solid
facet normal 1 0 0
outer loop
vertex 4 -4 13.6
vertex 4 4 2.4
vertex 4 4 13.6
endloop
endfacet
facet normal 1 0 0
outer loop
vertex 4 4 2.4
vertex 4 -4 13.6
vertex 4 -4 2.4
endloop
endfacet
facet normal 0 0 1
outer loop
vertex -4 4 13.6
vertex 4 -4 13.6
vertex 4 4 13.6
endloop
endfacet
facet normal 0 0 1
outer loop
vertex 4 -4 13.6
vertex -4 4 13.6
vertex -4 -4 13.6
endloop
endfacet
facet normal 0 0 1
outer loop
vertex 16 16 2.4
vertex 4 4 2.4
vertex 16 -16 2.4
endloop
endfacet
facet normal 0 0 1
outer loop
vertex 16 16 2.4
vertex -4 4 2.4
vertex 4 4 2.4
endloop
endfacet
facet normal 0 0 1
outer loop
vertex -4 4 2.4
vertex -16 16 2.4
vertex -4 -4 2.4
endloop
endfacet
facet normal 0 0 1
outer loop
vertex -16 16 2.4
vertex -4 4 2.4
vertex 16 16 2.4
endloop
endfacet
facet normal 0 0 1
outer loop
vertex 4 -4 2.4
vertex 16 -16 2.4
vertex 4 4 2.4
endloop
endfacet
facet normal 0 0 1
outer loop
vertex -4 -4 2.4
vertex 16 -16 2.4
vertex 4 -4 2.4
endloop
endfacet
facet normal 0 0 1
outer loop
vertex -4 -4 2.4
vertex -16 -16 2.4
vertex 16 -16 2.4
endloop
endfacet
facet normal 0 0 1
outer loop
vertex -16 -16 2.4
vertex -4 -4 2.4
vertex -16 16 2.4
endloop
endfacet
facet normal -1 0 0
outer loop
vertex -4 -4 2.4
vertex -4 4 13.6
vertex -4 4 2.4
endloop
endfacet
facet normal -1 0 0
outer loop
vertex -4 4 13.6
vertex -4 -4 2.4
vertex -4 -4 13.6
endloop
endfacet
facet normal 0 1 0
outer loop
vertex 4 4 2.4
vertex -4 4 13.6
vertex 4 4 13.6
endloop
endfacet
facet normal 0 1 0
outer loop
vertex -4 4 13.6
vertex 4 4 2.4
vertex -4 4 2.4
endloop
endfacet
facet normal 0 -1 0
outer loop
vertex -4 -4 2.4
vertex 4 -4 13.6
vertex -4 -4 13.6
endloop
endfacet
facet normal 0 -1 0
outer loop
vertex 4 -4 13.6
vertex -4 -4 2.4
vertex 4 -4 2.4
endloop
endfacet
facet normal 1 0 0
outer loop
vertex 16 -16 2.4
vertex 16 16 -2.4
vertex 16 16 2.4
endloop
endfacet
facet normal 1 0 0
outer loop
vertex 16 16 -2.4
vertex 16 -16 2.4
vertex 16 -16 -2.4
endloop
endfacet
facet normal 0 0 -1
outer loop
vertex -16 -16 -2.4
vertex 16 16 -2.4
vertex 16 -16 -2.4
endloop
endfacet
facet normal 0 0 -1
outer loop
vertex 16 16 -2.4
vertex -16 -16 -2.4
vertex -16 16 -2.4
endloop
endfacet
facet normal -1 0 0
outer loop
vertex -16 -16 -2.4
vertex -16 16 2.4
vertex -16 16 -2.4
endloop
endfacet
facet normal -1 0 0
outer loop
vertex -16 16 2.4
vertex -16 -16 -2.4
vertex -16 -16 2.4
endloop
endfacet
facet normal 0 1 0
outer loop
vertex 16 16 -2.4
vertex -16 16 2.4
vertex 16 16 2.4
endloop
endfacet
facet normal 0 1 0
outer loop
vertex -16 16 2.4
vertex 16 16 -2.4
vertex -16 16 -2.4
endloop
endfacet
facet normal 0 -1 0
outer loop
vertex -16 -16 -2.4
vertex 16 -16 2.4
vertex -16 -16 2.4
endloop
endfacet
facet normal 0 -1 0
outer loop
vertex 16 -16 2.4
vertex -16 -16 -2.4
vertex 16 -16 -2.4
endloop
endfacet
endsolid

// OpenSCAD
size=32; //block=32 //item=8

translate([0,0,size*0.25]){
cube([size*0.25,size*0.25,size*0.35],center=true);	//plate
};	//translate
cube([size*1,size*1,size*0.15],center=true);	//plate

%translate([0,0,size*0.35]){
end=8;
for(curr=[0:1:end]){
rotate([0,90,0]){
rotate([360/end*curr,0,0]){
translate([0,0,size*0.25]){
cube([size*0.15,size*0.15,size*0.5],center=true);
};	//translate
};	//rotate
};	//rotate

};	//for
};	//translate
